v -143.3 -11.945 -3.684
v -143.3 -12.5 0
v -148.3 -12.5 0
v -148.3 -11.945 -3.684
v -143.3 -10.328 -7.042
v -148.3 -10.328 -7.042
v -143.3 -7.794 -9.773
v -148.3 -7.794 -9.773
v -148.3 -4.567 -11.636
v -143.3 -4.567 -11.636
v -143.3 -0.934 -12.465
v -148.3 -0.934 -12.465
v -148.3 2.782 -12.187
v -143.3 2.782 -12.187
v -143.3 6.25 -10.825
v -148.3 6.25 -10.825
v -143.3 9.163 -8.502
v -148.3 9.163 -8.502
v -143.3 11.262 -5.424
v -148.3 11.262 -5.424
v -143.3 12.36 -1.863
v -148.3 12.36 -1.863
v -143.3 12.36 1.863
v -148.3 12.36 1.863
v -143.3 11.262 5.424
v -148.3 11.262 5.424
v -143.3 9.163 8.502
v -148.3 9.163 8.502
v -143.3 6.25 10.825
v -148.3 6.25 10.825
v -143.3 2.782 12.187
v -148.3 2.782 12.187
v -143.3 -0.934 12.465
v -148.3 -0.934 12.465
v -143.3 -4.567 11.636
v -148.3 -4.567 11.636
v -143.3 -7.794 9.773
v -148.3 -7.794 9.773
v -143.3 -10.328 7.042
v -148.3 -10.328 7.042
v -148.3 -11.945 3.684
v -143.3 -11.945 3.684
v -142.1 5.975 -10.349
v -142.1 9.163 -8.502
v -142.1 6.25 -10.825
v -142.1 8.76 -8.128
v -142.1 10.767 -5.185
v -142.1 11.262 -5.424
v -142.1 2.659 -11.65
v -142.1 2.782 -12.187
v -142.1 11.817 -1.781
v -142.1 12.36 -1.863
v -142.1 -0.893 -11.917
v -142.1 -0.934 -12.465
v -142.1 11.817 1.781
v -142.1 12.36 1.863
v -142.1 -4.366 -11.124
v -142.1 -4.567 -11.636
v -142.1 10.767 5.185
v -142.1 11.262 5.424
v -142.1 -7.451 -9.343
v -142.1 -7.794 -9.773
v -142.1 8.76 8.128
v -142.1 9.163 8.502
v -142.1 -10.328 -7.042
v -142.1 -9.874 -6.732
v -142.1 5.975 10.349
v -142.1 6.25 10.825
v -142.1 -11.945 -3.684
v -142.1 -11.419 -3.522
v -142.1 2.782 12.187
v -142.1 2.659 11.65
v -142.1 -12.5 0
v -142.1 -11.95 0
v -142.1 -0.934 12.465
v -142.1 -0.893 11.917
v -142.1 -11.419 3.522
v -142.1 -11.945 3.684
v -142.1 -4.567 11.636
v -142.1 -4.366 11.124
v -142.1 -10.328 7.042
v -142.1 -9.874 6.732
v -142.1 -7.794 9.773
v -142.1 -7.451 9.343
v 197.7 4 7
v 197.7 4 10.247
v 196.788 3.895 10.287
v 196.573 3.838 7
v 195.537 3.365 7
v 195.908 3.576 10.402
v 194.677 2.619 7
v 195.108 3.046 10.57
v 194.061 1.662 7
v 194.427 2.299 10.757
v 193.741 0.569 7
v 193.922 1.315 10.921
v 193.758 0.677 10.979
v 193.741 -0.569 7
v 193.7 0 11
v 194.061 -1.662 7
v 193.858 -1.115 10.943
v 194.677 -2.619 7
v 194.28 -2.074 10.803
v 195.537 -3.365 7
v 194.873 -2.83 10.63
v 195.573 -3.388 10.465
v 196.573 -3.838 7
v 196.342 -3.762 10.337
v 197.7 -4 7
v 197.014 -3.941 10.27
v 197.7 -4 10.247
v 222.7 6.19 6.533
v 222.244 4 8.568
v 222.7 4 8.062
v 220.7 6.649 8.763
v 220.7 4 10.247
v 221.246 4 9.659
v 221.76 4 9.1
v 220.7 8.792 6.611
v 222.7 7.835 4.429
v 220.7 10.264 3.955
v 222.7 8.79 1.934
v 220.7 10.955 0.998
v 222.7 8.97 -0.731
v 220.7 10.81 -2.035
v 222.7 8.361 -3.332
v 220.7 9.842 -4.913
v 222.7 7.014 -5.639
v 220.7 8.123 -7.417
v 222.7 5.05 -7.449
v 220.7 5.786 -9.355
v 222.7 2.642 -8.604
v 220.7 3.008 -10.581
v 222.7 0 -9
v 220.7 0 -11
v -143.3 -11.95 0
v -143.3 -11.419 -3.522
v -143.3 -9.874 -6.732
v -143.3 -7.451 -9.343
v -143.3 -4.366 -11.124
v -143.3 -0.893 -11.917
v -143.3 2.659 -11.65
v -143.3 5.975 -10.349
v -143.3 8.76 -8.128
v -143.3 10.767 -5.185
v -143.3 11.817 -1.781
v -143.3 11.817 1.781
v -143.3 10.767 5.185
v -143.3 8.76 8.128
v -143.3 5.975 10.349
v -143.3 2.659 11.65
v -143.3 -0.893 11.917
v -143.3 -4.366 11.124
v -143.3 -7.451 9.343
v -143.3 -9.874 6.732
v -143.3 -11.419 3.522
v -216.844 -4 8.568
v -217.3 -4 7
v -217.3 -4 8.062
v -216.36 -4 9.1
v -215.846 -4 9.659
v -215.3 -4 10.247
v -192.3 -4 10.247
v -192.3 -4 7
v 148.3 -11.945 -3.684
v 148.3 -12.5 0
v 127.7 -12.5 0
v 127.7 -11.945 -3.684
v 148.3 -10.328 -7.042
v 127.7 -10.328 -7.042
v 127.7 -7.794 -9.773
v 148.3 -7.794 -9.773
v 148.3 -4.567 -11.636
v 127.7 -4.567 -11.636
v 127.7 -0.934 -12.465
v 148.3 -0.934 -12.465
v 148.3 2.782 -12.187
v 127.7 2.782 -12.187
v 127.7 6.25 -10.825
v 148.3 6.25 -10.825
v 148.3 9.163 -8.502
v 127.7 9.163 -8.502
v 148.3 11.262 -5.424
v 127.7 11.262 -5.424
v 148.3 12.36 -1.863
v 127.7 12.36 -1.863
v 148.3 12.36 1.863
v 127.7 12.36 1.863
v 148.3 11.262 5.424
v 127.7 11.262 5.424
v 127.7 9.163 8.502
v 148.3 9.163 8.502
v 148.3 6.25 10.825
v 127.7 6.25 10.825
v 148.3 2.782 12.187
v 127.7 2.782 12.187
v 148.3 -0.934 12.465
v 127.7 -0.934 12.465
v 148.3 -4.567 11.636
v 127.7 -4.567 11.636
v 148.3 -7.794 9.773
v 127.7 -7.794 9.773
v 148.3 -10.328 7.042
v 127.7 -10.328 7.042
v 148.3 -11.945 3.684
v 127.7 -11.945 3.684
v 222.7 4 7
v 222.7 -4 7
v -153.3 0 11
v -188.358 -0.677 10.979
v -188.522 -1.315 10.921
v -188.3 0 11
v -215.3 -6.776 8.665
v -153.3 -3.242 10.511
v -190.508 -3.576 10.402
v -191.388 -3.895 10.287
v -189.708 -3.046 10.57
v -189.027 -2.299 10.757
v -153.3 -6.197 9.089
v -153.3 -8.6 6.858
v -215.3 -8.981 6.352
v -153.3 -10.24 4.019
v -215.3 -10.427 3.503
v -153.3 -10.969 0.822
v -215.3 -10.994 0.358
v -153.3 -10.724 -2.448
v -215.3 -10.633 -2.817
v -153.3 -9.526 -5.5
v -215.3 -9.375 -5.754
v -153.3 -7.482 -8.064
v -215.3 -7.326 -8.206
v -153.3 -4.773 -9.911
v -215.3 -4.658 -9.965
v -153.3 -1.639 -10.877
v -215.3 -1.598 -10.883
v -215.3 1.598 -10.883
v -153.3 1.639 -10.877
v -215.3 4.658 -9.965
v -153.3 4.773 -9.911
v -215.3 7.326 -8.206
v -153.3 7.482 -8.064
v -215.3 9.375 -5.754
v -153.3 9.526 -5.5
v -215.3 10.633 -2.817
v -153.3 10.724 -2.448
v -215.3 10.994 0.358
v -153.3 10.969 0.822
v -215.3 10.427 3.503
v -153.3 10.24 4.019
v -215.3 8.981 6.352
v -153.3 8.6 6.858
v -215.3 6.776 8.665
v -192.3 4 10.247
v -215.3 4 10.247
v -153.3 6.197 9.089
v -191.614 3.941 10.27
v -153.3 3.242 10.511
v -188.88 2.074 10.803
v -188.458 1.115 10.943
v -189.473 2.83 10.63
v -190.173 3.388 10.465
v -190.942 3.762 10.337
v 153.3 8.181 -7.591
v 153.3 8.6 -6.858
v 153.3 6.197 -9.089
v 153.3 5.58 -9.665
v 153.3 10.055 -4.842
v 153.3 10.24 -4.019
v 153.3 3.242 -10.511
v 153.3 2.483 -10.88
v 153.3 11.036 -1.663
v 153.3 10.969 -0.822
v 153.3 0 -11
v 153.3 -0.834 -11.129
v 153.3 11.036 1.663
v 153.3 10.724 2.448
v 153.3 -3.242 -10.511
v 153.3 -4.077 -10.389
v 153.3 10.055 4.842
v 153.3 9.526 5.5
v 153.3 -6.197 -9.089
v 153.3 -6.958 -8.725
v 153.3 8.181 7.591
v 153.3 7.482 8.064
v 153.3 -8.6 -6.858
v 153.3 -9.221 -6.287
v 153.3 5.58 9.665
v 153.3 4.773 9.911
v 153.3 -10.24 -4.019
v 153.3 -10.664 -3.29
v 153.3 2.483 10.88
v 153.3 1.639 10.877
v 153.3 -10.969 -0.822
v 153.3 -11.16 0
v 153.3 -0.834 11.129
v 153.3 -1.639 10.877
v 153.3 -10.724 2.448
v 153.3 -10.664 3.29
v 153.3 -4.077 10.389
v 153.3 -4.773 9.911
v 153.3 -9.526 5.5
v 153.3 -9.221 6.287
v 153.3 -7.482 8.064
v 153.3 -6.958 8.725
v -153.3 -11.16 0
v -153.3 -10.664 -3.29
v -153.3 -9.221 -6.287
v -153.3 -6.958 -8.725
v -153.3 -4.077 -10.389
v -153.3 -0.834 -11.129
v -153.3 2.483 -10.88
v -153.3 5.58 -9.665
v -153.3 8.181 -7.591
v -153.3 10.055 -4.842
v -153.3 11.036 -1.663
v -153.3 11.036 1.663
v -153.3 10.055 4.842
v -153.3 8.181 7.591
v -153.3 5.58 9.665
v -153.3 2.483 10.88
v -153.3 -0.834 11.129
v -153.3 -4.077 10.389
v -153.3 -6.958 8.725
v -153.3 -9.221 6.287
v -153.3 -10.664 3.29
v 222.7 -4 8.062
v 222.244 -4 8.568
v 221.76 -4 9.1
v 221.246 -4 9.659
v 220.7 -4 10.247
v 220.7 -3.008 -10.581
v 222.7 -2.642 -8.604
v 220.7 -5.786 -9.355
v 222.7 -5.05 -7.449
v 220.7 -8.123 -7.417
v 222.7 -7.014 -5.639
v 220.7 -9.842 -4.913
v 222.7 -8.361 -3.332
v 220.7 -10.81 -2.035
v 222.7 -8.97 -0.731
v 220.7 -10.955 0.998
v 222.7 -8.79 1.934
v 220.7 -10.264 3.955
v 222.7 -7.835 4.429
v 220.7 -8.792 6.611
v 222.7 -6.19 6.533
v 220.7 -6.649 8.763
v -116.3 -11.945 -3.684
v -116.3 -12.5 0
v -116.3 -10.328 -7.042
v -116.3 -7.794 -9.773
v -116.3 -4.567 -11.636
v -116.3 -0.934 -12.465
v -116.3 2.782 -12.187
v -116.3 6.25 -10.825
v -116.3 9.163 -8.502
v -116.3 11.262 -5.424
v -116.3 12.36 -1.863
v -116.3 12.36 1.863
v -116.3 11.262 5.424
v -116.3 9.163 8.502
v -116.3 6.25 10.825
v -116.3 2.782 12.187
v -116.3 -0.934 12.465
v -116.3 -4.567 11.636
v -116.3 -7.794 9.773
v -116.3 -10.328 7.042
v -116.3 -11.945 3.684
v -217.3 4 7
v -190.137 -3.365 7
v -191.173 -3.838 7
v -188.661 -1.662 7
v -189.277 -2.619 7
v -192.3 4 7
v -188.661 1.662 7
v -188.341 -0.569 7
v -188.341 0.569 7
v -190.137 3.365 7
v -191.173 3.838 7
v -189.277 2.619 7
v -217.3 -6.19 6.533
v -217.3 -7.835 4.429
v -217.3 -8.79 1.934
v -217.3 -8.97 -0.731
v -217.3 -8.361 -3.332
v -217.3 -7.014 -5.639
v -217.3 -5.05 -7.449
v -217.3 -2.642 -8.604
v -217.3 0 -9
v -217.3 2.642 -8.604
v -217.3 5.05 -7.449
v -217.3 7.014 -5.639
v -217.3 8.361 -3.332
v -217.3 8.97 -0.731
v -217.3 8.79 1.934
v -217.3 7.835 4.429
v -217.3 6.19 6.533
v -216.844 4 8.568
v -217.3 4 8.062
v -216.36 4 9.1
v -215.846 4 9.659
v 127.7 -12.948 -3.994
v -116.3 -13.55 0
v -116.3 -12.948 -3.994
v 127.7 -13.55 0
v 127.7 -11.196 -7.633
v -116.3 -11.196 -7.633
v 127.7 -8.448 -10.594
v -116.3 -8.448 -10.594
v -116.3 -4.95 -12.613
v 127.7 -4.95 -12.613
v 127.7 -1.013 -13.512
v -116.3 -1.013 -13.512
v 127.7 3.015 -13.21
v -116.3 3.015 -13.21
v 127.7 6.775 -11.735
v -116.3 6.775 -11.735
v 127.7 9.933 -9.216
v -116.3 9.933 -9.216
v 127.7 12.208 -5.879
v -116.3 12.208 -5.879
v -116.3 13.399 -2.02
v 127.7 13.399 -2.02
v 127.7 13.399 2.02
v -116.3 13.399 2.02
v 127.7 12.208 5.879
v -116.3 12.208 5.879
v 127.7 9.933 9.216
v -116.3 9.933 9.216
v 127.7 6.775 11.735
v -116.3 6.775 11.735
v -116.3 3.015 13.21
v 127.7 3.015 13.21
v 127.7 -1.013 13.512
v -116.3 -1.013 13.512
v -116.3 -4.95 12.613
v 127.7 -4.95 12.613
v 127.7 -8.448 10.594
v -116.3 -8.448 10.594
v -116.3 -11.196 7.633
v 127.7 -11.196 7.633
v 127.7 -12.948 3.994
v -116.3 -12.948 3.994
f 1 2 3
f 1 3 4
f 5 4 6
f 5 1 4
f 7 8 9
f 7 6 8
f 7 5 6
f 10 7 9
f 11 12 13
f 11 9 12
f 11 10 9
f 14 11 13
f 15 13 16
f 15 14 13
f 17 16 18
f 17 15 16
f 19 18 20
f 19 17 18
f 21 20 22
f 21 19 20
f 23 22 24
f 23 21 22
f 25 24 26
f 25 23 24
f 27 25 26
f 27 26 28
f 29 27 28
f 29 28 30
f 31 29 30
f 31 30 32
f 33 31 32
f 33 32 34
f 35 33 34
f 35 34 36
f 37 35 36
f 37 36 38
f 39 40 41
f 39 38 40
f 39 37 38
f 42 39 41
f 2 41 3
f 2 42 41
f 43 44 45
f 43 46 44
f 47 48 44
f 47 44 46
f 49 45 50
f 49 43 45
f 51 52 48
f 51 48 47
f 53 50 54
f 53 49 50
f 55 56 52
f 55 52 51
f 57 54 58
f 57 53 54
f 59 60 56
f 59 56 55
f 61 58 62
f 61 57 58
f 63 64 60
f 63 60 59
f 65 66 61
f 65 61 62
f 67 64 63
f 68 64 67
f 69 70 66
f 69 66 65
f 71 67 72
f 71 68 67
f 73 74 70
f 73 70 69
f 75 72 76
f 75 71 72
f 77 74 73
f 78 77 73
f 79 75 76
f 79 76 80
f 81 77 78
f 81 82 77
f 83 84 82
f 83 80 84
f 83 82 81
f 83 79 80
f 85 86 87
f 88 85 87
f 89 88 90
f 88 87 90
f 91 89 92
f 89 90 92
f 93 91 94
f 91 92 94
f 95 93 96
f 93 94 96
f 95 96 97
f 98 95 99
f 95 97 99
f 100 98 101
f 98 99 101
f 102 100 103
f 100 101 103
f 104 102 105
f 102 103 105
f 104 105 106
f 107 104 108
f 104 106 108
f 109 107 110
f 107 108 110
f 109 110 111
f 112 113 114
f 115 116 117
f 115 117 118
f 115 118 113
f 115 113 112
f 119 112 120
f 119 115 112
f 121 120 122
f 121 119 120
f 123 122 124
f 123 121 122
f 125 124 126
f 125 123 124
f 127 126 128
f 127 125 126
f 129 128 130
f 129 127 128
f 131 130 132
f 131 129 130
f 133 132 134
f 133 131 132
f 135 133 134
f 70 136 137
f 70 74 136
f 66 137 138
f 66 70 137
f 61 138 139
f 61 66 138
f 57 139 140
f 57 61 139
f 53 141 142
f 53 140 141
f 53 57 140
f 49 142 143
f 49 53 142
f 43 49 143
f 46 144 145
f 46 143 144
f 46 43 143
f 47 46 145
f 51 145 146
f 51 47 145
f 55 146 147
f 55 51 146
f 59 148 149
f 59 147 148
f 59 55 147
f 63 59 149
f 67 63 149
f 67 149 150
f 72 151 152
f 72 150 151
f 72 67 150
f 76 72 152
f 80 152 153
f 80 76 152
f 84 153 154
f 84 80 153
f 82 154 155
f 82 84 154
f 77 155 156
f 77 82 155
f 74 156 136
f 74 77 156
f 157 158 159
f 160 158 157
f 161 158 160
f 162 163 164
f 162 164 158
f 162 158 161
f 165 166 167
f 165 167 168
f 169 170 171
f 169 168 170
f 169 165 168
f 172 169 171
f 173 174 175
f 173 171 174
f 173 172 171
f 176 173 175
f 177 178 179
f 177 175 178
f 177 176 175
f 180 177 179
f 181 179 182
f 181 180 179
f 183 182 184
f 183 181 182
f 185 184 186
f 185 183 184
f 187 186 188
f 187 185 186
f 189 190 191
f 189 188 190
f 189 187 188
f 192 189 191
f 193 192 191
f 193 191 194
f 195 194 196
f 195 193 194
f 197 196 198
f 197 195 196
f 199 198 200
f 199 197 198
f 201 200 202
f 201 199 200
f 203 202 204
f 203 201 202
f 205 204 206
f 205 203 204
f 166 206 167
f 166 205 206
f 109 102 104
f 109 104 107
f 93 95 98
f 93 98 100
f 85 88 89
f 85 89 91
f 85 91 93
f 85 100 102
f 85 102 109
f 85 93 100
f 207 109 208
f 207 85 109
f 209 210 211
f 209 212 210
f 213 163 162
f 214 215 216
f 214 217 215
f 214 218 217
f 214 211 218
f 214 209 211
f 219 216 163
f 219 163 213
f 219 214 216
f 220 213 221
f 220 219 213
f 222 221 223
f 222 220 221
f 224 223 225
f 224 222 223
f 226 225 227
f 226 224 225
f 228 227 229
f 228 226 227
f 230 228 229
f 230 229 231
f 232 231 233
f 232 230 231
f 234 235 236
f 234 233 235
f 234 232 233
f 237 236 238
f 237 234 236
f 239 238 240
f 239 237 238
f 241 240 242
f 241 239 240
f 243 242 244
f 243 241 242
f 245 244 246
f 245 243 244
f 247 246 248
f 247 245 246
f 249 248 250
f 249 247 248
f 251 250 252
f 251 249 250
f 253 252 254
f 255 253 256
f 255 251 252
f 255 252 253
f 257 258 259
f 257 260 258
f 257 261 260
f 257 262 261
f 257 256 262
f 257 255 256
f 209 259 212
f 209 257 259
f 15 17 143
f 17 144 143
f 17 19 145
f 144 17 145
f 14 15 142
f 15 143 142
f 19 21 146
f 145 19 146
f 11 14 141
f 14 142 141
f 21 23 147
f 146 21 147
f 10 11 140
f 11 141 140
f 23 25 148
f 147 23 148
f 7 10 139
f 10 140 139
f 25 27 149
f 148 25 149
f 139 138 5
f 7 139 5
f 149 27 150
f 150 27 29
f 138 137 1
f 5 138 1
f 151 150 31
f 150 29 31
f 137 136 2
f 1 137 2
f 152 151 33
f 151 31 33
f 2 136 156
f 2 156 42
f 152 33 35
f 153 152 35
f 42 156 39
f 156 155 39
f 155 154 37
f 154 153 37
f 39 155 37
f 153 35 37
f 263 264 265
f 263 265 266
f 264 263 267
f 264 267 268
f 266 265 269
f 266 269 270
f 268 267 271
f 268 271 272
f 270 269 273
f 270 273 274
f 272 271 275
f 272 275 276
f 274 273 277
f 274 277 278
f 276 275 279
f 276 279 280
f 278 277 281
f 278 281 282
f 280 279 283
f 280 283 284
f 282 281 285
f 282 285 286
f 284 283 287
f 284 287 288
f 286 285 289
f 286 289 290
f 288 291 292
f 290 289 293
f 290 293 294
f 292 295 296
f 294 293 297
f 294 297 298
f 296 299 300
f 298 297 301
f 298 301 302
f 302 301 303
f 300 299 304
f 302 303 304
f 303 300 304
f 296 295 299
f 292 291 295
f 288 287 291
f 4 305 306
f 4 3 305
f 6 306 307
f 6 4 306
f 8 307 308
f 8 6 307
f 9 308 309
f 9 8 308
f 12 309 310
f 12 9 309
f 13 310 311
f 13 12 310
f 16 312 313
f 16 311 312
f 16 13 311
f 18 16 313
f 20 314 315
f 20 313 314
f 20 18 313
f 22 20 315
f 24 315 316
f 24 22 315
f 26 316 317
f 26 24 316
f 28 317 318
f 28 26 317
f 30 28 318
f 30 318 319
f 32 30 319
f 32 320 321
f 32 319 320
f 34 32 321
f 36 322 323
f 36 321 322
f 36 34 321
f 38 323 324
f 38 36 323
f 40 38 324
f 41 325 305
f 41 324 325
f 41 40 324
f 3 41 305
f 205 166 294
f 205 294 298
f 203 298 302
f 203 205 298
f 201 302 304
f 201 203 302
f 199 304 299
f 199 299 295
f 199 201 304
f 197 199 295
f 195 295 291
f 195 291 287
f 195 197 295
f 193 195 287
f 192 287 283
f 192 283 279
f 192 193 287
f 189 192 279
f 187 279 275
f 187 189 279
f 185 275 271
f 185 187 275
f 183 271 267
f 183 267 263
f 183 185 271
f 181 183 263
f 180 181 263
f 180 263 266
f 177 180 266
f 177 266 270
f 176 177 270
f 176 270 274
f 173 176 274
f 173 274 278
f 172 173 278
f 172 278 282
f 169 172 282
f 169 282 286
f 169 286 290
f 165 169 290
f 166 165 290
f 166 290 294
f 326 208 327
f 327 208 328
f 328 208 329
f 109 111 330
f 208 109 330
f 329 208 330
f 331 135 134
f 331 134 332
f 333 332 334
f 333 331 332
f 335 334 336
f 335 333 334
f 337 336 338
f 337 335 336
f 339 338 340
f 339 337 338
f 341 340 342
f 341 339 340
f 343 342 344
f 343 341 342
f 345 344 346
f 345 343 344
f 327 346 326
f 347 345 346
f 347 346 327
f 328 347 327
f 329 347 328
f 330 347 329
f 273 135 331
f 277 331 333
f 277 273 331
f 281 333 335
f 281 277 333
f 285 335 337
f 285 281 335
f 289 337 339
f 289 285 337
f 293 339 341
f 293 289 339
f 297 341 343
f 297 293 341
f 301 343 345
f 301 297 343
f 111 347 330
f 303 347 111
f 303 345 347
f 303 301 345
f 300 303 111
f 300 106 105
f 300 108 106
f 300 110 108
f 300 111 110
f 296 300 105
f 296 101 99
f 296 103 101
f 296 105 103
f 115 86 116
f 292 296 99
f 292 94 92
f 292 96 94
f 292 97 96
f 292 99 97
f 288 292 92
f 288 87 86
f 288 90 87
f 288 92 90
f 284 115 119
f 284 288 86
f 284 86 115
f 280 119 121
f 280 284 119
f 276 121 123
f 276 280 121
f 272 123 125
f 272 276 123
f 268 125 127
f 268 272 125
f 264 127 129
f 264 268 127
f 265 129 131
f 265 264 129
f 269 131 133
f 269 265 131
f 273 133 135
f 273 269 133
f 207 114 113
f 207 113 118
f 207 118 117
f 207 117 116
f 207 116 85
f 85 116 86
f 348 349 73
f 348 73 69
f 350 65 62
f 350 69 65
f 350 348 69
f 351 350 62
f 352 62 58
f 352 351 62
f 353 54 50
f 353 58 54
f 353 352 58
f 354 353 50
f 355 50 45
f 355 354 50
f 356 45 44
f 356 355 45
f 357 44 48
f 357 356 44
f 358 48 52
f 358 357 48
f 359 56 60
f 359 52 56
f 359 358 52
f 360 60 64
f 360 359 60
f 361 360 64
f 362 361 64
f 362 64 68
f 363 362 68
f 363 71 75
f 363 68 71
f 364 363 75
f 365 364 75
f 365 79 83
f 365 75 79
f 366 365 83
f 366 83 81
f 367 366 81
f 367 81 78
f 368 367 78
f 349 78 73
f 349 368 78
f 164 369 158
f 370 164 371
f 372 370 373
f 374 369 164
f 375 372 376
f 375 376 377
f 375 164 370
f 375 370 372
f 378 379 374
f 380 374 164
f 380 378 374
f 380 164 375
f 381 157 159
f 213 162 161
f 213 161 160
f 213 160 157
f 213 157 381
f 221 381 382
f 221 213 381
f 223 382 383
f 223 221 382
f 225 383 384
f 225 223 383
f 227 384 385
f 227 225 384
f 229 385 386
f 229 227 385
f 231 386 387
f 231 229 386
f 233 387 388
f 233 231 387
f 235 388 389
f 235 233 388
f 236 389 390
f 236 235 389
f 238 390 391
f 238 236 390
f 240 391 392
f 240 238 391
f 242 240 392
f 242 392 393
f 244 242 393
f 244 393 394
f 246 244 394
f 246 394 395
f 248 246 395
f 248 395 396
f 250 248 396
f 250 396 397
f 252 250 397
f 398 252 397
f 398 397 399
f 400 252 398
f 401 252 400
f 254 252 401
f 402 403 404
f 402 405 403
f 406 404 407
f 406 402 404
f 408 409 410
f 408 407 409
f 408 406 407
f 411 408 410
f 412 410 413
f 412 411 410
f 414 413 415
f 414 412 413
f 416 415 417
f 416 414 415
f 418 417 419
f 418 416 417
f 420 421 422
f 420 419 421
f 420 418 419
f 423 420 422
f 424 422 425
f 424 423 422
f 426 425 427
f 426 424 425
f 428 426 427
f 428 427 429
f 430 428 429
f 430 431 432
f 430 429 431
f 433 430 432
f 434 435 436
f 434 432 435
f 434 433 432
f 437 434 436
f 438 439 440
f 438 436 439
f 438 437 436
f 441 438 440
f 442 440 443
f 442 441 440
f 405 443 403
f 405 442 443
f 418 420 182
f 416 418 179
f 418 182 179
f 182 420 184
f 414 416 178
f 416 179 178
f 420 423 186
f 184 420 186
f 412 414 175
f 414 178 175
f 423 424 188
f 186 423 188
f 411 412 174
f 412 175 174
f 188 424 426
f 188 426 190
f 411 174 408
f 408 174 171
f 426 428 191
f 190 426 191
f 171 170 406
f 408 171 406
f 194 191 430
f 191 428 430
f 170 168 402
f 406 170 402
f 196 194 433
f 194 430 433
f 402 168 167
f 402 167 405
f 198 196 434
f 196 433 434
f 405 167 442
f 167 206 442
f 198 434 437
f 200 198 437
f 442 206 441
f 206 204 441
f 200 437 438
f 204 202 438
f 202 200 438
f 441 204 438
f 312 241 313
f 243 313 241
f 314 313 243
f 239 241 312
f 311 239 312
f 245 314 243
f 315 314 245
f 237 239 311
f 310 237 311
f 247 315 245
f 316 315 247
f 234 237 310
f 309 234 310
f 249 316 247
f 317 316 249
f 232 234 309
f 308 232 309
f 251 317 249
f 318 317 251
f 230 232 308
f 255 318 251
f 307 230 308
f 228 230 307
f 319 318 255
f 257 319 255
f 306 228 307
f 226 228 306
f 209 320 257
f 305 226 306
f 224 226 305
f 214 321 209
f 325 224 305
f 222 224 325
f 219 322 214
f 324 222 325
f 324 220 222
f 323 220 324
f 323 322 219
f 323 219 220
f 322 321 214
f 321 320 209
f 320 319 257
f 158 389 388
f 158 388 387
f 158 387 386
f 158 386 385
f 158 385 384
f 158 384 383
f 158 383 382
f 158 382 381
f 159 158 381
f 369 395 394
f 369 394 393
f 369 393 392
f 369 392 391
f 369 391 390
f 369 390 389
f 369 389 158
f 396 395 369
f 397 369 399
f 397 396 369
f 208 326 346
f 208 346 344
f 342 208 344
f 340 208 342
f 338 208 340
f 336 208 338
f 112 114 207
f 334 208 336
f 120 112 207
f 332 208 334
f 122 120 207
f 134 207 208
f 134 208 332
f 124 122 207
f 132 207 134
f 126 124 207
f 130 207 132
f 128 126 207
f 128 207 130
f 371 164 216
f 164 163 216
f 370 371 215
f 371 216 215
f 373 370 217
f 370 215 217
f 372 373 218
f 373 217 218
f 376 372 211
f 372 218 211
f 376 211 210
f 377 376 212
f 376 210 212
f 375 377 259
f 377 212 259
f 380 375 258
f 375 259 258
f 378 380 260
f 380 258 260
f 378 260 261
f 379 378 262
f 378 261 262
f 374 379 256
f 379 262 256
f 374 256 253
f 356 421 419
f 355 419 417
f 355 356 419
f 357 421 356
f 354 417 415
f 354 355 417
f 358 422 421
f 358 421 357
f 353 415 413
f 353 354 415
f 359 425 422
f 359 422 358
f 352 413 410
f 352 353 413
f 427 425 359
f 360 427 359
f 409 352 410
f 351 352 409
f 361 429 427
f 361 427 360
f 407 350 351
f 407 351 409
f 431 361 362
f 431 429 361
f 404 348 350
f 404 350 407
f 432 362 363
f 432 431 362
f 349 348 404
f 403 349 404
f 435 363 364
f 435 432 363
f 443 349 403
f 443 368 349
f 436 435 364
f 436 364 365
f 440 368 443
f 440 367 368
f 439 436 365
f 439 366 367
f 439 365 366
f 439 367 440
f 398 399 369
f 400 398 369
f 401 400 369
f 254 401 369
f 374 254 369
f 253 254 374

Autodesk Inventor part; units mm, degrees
ref_plane "YZ Plane" through (0, 0, 0) normal (1, 0, 0) x (0, 1, 0)
ref_plane "XZ Plane" through (0, 0, 0) normal (0, 1, 0) x (-1, 0, 0)
sketch "Sketch1" plane through (0, 0, 0) normal (0, 0, 1) x (1, 0, 0)
  line L0 (-153.3, -12.5) -> (-143.3, -12.5)
  line L1 (-143.3, -12.5) -> (-143.3, -11.95)
  line L2 (-143.3, -11.95) -> (-142.1, -11.95)
  line L3 (-142.1, -11.95) -> (-142.1, -12.5)
  line L4 (-142.1, -12.5) -> (-116.3, -12.5)
  line L5 (-116.3, -12.5) -> (-116.3, -13.55)
  line L6 (-116.3, -13.55) -> (127.7, -13.55)
  line L7 (127.7, -13.55) -> (127.7, -12.5)
  line L8 (127.7, -12.5) -> (153.3, -12.5)
  line L9 (153.3, -12.5) -> (153.3, 0)
  line L10 (153.3, 0) -> (-153.3, 0)
  line L11 (-153.3, 0) -> (-153.3, -12.5)
  point P0 (0, 0)
  point P1 (0, 0)
  point P2 (127.7, -13.025)
  point P3 (-153.3, -6.25)
  dimension "d0" = 12.5
  dimension "d1" = 10
  dimension "d2" = 1.2
  dimension "d3" = 0.55
  dimension "d4" = 25.8
  dimension "d5" = 13.55
  dimension "d6" = 11.95
  dimension "d7" = 244
  dimension "d8" = 12.5
  dimension "d26" = 306.6
revolve "Revolution1" add sketch "Sketch1" angle 360 about axis through (153.3, 0, 0) along (-1, 0, 0)
sketch "Sketch2" plane through (-153.3, 0, 0) normal (-1, 0, 0) x (0, 0, 1)
  circle A0 centre (0, 0) radius 11
  point P0 (0, 0)
  dimension "d11" = 22
extrude "Extrusion1" add sketch "Sketch2" along normal blind 64
sketch "Sketch3" plane through (153.3, 0, 0) normal (1, 0, 0) x (0, 0, -1)
  point P0 (0, 0)
sketch "Sketch4" plane through (153.3, 0, 0) normal (1, 0, 0) x (0, 0, -1)
  circle A0 centre (0, 0) radius 11
  point P0 (0, 0)
  dimension "d14" = 22
extrude "Extrusion2" add sketch "Sketch4" along normal blind 69.4
ref_plane "Work Plane1" through (-153.3, 0, 11) normal (0, 0, 1) x (1, 0, 0)
sketch "Sketch5" plane through (-153.3, 0, 11) normal (0, 0, 1) x (1, 0, 0)
  line L0 (-64, 11) -> (-64, -11) projected
  line L1 (-64, 4) -> (-39, 4)
  line L2 (-39, 4) -> (-39, -4)
  line L3 (-39, -4) -> (-64, -4)
  line L4 (-64, -4) -> (-64, 4)
  circle A0 centre (-39, 0) radius 4
  line L5 (376, -11) -> (376, 11) projected
  line L6 (376, 4) -> (351, 4)
  line L7 (351, 4) -> (351, -4)
  line L8 (351, -4) -> (376, -4)
  line L9 (376, -4) -> (376, 4)
  circle A1 centre (351, 0) radius 4
  point P0 (153.3, 0)
  point P1 (-64, 0)
  point P2 (376, 0)
  point P3 (376, 0)
  dimension "d17" = 8
  dimension "d18" = 25
  dimension "d19" = 8
  dimension "d20" = 25
extrude "Extrusion3" cut sketch "Sketch5" against normal blind 4
chamfer "Chamfer1" distance 2 angle 45 3 edges at (-217.3, 0, -11) (222.7, -10.8101, -2.0351) (222.7, 10.8101, -2.0351)
chamfer "Chamfer2" distance 5 angle 15 1 edges at (-153.3, 12.5, 0) measured on face at (-149.9667, -12.3381, -2.0051)
chamfer "Chamfer3" distance 5 angle 15 1 edges at (153.3, 12.5, 0) measured on face at (136.2333, -12.3381, -2.0051)
properties part number "Shaft" material "Steel, High Strength, Low Alloy"
